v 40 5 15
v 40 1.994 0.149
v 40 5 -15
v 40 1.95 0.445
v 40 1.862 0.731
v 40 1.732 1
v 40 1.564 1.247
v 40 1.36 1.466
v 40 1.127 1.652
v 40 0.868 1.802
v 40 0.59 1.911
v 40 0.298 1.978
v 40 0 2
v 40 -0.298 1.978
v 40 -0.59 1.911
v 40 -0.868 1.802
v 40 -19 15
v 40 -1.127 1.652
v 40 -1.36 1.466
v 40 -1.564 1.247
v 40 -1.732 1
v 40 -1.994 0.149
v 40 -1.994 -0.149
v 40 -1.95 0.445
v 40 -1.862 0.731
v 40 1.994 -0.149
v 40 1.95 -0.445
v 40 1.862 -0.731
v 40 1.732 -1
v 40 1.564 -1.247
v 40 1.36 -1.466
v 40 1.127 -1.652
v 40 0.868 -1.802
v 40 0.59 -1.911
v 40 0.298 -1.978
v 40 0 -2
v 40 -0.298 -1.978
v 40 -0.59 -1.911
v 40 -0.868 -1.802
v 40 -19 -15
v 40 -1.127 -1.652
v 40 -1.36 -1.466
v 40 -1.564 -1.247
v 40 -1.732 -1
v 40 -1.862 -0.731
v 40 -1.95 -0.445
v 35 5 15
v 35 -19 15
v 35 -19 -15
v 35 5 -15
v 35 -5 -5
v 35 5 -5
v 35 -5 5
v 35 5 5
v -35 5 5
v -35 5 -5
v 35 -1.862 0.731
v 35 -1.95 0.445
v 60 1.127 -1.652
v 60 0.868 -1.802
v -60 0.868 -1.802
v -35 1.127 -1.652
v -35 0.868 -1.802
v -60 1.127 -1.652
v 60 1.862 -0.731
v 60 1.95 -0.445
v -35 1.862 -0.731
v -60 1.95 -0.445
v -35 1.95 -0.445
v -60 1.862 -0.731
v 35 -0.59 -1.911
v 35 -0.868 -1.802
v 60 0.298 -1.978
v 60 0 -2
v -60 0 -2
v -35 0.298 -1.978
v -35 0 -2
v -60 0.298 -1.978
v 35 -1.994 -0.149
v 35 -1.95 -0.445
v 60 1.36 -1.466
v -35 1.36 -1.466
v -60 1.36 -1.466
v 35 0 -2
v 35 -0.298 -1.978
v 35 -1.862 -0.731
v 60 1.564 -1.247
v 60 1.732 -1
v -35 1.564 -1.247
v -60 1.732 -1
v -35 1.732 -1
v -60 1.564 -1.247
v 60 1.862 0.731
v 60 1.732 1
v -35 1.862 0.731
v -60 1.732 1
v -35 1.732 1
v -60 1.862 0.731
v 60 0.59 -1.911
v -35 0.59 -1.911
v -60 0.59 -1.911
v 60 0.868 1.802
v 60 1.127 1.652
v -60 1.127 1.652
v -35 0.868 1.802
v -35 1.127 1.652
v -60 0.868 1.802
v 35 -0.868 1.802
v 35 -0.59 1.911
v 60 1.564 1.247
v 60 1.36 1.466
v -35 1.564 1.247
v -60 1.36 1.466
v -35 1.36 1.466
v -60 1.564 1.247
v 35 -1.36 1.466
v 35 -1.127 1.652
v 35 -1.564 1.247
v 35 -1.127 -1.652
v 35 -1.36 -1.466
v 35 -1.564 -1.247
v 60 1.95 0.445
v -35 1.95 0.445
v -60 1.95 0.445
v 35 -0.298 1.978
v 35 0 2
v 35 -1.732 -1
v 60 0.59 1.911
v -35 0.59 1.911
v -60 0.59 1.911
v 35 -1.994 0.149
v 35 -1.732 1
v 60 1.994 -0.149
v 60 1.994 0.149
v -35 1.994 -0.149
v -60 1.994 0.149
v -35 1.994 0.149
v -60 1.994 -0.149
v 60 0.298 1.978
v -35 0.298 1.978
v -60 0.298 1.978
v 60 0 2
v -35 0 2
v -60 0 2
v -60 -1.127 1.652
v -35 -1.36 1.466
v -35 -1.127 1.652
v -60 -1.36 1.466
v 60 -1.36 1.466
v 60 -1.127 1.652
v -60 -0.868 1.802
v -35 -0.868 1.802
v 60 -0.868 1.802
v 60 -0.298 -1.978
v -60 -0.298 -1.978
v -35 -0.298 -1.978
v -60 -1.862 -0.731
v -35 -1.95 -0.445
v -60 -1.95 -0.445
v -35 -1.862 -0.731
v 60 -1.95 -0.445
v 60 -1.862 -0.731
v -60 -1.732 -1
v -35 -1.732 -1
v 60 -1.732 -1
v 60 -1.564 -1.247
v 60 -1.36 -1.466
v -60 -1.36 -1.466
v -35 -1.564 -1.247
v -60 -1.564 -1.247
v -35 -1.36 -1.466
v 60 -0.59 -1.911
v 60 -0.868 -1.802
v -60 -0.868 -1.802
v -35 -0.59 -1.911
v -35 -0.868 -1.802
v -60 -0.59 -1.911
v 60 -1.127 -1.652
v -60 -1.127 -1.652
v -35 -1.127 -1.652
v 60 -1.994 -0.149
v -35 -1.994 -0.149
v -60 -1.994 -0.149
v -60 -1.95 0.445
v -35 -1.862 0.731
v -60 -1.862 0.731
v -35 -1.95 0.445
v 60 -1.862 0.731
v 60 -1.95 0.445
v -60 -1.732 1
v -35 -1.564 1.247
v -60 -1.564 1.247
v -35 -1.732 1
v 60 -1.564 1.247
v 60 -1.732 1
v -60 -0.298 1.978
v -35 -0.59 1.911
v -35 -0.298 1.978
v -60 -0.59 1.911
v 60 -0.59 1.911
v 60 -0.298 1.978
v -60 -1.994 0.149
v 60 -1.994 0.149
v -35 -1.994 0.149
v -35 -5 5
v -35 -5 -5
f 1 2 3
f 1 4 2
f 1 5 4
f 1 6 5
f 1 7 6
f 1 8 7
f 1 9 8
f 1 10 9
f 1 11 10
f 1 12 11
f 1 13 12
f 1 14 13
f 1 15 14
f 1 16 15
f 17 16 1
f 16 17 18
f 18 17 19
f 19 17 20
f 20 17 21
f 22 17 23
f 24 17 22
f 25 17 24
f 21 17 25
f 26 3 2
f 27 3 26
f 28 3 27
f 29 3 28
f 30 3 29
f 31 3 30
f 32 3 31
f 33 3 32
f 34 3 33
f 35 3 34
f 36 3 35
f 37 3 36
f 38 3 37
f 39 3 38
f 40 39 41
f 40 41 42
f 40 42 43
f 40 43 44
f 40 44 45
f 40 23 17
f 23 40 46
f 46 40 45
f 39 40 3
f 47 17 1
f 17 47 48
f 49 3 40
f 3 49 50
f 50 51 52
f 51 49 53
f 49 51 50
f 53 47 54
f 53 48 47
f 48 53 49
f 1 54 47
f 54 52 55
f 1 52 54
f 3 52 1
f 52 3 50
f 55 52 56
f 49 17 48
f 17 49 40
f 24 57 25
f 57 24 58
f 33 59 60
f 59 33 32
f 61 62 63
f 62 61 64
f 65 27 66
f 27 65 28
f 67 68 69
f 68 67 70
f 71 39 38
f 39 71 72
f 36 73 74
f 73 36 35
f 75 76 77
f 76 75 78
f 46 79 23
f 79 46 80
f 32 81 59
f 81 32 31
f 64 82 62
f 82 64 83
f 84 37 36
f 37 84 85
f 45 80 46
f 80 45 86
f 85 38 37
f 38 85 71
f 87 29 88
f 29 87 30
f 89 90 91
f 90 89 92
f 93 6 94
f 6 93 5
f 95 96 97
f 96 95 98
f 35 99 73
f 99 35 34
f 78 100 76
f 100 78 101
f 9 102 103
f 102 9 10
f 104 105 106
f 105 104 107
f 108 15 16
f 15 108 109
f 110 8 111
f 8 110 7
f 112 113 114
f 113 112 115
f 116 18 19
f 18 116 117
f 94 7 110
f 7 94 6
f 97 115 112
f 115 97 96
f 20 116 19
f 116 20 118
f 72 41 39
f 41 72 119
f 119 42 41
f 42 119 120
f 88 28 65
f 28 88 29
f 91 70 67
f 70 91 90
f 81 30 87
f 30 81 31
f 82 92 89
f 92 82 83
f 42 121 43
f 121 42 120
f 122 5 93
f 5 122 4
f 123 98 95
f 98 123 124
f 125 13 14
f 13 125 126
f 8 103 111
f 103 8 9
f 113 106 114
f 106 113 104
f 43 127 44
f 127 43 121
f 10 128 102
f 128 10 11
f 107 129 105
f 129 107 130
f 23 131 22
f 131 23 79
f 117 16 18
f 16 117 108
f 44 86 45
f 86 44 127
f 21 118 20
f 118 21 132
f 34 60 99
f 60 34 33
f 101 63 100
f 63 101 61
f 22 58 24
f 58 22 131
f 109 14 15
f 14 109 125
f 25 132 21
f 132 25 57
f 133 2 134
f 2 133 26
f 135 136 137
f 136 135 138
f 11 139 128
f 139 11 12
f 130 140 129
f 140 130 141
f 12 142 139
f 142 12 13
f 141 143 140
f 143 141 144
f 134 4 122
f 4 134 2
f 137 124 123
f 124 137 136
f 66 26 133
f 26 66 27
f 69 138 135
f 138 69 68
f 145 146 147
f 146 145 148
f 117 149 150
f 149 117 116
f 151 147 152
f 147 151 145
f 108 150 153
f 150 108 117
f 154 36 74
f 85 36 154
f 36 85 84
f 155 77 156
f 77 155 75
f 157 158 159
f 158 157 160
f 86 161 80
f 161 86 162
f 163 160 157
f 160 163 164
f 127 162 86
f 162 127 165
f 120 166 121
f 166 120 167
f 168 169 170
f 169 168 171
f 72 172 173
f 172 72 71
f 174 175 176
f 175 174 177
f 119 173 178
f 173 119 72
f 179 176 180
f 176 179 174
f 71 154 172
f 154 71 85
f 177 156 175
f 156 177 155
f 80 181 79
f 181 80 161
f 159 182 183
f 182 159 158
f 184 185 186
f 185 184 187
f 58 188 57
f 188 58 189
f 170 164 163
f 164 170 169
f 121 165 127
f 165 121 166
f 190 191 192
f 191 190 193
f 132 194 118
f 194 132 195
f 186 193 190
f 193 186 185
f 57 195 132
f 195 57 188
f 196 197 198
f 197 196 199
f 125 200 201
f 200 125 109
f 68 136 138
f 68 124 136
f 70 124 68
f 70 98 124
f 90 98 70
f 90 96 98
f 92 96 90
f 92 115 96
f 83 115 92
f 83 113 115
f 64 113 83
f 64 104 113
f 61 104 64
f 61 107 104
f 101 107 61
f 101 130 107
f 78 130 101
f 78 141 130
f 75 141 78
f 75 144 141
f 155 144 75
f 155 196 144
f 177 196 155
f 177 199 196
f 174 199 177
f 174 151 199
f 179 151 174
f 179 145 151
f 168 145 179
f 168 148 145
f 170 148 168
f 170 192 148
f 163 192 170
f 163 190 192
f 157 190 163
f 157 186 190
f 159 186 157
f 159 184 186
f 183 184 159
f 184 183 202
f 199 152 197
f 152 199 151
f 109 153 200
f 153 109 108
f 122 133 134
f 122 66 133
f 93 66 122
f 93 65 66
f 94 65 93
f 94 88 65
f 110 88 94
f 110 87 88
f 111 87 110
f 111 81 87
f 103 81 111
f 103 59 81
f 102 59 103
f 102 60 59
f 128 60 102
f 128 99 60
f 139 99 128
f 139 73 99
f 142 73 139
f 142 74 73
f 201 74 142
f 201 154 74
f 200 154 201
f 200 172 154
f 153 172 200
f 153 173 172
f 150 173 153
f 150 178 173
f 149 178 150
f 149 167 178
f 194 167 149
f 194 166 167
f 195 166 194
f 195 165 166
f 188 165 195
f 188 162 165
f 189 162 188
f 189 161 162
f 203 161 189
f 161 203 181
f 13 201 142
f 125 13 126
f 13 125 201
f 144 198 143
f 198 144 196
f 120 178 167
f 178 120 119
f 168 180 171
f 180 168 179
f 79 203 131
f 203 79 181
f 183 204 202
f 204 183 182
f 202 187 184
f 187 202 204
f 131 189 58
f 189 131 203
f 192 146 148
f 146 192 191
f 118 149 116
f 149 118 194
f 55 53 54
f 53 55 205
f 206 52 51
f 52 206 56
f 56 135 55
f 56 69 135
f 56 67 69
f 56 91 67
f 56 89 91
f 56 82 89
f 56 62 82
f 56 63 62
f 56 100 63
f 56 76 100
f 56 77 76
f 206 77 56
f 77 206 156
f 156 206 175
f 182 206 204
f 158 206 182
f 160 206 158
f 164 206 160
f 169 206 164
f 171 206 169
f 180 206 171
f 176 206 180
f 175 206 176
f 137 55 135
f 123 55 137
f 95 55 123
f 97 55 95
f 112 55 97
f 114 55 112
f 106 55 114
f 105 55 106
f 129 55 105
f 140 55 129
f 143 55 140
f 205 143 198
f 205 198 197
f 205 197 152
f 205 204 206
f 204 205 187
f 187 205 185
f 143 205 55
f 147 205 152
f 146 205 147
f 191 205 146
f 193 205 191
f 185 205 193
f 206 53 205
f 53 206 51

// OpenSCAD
$fa = 3;
$fs = 0.3;

module tope_posterior(){
difference(){
cube([5,42,34], center=true);
    translate([0,13,9])
    rotate([0,90,0])
    cylinder(h=5.1,d=4, center=true);
    translate([0,13,-9])
    rotate([0,90,0])
    cylinder(h=5.1,d=4, center=true);
}
}
//tope_posterior();
module barra(){
cube([70,10,10],center=true);
}
rotate([0,90,0])
color("gray") cylinder(h=120, d=4, center=true);

module tope_davanter(){
difference(){
cube([5, 24, 30], center=true);
    translate([0,7,0])
    rotate([0,90,0])
    cylinder(h=5.1,d=4,center=true);
}
}

barra();
translate([37.5,-7,0])
tope_davanter();
